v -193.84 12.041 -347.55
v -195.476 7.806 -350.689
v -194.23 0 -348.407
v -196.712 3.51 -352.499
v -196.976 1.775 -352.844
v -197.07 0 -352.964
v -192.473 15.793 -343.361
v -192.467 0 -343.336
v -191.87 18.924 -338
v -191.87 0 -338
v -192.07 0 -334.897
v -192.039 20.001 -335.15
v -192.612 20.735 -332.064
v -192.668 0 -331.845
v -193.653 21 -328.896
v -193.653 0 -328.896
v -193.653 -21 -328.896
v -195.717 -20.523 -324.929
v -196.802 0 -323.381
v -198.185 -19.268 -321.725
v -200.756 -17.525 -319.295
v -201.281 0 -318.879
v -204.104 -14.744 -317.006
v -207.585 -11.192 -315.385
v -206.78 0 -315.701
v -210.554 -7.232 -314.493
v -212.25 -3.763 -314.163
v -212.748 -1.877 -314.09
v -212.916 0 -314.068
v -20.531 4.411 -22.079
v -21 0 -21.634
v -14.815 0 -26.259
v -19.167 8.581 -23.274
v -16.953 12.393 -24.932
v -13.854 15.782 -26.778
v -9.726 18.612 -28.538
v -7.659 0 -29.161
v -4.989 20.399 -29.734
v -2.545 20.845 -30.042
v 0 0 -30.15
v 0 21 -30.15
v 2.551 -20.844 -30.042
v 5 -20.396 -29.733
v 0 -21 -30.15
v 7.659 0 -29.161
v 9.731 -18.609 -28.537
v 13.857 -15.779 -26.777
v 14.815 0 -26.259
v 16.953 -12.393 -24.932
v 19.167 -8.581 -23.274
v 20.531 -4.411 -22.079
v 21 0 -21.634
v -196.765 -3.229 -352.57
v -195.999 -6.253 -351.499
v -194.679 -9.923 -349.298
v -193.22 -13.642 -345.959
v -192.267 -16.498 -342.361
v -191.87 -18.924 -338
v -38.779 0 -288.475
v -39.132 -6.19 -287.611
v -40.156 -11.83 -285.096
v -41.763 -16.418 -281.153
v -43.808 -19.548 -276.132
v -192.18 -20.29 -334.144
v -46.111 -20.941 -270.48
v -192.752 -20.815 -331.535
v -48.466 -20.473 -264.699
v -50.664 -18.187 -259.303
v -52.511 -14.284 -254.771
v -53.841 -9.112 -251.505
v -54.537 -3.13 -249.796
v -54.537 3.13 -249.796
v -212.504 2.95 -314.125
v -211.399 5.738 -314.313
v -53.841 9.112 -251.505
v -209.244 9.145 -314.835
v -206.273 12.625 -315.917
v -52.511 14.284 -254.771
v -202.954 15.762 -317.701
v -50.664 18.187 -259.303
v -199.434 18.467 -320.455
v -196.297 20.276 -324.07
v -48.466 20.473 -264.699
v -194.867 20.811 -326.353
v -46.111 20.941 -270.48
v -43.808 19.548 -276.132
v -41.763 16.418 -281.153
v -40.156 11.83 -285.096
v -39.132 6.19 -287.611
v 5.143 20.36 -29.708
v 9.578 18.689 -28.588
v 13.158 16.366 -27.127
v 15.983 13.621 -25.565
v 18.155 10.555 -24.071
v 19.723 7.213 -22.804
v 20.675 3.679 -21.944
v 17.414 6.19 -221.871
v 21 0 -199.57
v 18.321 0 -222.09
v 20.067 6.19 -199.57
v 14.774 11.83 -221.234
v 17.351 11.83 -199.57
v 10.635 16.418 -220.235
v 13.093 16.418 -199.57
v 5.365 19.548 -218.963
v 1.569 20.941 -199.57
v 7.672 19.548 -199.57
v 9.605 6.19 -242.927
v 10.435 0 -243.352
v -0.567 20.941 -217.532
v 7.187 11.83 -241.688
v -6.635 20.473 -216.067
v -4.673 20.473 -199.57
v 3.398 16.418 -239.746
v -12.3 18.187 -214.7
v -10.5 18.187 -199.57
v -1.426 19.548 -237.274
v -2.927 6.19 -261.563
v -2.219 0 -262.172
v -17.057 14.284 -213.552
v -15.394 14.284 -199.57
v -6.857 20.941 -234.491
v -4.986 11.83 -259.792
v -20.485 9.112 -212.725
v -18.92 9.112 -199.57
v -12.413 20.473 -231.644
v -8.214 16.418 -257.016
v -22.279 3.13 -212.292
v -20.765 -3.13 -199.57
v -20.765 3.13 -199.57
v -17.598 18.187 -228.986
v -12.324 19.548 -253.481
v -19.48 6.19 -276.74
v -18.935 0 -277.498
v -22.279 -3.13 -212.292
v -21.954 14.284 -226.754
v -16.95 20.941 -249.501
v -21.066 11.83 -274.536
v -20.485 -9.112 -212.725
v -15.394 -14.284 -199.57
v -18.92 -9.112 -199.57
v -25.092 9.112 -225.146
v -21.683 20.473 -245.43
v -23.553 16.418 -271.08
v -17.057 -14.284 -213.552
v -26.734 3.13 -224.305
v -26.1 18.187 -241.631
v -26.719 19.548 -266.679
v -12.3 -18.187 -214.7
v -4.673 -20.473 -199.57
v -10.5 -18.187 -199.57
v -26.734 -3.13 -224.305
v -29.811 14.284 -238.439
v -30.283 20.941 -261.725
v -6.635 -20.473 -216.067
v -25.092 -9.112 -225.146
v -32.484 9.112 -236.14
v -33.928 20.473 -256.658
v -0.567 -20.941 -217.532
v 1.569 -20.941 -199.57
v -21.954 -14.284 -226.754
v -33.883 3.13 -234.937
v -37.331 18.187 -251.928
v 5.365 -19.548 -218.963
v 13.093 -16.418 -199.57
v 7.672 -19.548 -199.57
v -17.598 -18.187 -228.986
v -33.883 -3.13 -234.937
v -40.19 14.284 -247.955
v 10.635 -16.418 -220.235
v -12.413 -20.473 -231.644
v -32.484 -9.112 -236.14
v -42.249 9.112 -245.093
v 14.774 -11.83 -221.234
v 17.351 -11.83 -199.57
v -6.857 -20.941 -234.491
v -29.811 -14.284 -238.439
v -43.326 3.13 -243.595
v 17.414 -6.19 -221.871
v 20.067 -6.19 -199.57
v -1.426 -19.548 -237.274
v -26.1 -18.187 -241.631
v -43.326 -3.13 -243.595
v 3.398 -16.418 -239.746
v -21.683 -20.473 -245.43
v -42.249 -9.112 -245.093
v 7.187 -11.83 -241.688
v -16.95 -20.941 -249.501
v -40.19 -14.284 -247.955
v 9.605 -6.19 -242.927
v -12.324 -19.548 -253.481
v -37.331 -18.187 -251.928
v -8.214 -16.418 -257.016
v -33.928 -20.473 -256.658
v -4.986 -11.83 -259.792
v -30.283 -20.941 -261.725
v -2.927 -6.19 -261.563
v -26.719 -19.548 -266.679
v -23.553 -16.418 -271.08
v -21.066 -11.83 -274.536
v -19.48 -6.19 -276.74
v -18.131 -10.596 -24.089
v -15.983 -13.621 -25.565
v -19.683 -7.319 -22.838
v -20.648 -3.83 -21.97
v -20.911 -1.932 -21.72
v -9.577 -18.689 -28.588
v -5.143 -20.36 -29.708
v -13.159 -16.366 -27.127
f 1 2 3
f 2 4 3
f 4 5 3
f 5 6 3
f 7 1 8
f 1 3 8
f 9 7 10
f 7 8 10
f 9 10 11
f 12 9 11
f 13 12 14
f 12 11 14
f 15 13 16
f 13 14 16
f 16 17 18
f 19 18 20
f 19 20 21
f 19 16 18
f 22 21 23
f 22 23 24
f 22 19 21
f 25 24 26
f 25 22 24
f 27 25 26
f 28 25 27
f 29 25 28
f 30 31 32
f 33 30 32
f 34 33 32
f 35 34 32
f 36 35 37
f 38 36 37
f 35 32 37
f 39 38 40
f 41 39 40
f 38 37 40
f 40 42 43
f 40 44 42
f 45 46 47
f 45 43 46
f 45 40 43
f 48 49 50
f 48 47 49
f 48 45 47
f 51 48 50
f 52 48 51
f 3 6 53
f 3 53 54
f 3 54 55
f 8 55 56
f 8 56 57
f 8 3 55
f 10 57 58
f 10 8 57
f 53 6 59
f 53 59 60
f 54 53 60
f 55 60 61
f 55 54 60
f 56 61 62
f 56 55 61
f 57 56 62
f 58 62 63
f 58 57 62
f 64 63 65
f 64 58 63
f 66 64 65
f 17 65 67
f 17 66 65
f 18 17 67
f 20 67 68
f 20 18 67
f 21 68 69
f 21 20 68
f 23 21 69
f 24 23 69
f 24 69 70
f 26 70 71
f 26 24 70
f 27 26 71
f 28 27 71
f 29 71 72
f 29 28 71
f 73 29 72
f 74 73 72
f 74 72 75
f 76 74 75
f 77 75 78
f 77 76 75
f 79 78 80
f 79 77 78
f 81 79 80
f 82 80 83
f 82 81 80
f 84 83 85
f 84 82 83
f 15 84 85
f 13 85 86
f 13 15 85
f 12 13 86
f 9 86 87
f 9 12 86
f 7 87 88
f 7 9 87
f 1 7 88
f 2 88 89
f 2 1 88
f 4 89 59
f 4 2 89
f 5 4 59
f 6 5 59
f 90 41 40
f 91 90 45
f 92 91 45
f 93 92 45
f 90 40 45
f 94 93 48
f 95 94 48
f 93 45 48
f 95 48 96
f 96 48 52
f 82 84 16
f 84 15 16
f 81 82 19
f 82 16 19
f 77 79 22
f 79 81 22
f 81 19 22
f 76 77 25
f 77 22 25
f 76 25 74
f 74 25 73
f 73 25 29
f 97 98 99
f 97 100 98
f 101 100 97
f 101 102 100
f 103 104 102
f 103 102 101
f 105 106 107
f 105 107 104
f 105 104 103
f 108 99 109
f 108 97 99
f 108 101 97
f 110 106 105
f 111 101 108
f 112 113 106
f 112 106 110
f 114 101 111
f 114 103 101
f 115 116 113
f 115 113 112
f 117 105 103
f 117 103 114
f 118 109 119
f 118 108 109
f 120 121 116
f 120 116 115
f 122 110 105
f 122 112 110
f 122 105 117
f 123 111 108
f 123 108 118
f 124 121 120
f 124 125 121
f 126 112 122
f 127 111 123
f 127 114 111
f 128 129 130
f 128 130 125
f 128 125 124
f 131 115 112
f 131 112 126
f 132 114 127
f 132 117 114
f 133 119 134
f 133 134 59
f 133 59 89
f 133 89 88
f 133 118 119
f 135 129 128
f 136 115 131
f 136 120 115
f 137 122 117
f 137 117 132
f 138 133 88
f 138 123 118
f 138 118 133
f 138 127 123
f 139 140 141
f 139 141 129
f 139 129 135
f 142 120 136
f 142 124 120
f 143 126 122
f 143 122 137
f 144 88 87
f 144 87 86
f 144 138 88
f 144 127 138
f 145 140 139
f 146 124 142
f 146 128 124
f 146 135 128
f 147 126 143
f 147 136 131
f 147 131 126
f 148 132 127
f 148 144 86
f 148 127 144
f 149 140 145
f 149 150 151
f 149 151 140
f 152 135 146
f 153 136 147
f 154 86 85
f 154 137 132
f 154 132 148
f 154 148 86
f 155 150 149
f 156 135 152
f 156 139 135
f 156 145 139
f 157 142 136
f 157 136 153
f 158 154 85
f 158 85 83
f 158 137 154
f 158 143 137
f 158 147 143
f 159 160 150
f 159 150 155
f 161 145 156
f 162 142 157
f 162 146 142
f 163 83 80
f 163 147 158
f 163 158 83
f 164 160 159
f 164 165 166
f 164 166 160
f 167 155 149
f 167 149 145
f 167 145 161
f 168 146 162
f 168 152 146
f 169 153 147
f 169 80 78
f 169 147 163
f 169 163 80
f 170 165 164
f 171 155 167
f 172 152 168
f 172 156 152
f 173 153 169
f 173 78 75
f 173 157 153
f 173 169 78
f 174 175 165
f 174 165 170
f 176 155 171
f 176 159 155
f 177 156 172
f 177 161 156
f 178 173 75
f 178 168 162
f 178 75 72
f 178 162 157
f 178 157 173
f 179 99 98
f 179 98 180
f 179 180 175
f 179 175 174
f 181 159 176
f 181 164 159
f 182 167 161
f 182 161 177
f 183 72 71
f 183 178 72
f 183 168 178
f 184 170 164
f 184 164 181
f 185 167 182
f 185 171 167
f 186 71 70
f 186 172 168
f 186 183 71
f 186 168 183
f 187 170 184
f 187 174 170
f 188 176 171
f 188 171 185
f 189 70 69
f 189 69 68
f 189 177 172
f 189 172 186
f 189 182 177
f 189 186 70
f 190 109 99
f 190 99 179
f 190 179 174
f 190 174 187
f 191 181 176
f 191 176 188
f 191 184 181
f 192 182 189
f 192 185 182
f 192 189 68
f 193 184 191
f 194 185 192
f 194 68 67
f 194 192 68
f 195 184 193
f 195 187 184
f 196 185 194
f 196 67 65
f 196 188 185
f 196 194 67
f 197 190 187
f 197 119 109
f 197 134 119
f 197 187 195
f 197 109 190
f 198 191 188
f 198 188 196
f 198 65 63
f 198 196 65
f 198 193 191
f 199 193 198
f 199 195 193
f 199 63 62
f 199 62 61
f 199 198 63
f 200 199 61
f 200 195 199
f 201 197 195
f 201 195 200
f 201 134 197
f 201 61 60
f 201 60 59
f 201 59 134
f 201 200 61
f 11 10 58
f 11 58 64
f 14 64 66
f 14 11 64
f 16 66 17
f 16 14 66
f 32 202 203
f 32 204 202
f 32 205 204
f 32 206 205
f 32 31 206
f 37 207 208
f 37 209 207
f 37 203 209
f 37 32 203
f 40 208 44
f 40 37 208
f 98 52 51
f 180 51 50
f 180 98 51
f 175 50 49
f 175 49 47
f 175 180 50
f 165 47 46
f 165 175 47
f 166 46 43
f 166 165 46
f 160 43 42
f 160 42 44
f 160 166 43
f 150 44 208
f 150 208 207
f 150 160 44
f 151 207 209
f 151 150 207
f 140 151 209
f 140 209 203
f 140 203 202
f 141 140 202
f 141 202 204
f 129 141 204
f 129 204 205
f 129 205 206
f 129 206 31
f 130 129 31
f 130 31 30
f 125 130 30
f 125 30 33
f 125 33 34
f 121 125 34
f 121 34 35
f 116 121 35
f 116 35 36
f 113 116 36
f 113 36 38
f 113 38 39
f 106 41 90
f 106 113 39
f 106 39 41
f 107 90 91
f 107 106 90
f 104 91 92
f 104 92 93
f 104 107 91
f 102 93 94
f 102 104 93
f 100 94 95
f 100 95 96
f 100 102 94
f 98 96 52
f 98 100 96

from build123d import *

# Parameters (mm, degrees)
F1_R          = 21
F3_DEPTH      = 21.0010001
F3_DEPTH_BACK = 21.0010001


with BuildPart() as f2:
    # F2: sweep along a path in F0
    with BuildLine(Plane.XZ) as f2_path:
        Line((0, 0), (0, -199.5701125716))
        ThreePointArc((0, -199.5701125716), (-12.7613665352, -241.419276296), (-46.7027334515, -269.0270395543))
        Line((-46.7027334515, -269.0270395543), (-216, -338))
    # F1 (on Top) → F2 (sweep)
    with BuildSketch(Plane.XY):
        Circle(F1_R)
    sweep(path=f2_path.line)

    # F0 (on Front) → F3 (cut, two sides)
    with BuildSketch(Plane.XZ) as f3_sk:
        with BuildLine():
            ThreePointArc((0, -30.15), (21.3192694528, -21.3192694528), (30.15, 0))
            ThreePointArc((30.15, 0), (-21.3192694528, 21.3192694528), (0, -30.15))
        make_face()
        with BuildLine():
            ThreePointArc((-191.87, -338), (-192.3200446948, -333.3613992688), (-193.6533913588, -328.8958261091))
            ThreePointArc((-193.6533913588, -328.8958261091), (-239.6799553052, -342.6386007312), (-191.87, -338))
        make_face()
    extrude(amount=-F3_DEPTH, mode=Mode.SUBTRACT)
    extrude(f3_sk.sketch, amount=F3_DEPTH_BACK, mode=Mode.SUBTRACT)


solid = f2.part
